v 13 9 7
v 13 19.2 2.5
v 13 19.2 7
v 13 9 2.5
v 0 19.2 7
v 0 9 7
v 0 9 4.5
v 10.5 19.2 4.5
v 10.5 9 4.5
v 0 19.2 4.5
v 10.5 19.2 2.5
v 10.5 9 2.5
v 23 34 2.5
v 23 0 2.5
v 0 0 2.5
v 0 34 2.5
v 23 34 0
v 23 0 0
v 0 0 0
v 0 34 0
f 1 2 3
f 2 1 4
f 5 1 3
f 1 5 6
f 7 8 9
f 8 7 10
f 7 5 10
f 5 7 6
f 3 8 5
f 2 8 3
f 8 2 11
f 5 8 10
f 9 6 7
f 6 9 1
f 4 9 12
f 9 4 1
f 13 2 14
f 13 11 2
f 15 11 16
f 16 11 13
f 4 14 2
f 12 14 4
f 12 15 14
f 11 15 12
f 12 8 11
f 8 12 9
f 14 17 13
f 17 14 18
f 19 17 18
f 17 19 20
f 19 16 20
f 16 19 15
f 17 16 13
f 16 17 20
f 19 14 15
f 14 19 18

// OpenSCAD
echo(version=version());

// Values are in millimeters

$fa=1;
$fs=1;
////////////////////////////
function weather_shield_dims(has_lux=true) = [23, 34, has_lux?7:2.5];

module weather_shield(has_lux=true) {
	motenio = [23, 34, 2.5];
	cube(motenio);

	if(has_lux) {
		translate([0, 9, 4.5]) {
			cube([13, 10.2, 2.5]);
		}
		translate([13-2.5, 9, 2.5]) {
			cube([2.5, 10.2, 2.5]);
		}
	}
}

weather_shield();
